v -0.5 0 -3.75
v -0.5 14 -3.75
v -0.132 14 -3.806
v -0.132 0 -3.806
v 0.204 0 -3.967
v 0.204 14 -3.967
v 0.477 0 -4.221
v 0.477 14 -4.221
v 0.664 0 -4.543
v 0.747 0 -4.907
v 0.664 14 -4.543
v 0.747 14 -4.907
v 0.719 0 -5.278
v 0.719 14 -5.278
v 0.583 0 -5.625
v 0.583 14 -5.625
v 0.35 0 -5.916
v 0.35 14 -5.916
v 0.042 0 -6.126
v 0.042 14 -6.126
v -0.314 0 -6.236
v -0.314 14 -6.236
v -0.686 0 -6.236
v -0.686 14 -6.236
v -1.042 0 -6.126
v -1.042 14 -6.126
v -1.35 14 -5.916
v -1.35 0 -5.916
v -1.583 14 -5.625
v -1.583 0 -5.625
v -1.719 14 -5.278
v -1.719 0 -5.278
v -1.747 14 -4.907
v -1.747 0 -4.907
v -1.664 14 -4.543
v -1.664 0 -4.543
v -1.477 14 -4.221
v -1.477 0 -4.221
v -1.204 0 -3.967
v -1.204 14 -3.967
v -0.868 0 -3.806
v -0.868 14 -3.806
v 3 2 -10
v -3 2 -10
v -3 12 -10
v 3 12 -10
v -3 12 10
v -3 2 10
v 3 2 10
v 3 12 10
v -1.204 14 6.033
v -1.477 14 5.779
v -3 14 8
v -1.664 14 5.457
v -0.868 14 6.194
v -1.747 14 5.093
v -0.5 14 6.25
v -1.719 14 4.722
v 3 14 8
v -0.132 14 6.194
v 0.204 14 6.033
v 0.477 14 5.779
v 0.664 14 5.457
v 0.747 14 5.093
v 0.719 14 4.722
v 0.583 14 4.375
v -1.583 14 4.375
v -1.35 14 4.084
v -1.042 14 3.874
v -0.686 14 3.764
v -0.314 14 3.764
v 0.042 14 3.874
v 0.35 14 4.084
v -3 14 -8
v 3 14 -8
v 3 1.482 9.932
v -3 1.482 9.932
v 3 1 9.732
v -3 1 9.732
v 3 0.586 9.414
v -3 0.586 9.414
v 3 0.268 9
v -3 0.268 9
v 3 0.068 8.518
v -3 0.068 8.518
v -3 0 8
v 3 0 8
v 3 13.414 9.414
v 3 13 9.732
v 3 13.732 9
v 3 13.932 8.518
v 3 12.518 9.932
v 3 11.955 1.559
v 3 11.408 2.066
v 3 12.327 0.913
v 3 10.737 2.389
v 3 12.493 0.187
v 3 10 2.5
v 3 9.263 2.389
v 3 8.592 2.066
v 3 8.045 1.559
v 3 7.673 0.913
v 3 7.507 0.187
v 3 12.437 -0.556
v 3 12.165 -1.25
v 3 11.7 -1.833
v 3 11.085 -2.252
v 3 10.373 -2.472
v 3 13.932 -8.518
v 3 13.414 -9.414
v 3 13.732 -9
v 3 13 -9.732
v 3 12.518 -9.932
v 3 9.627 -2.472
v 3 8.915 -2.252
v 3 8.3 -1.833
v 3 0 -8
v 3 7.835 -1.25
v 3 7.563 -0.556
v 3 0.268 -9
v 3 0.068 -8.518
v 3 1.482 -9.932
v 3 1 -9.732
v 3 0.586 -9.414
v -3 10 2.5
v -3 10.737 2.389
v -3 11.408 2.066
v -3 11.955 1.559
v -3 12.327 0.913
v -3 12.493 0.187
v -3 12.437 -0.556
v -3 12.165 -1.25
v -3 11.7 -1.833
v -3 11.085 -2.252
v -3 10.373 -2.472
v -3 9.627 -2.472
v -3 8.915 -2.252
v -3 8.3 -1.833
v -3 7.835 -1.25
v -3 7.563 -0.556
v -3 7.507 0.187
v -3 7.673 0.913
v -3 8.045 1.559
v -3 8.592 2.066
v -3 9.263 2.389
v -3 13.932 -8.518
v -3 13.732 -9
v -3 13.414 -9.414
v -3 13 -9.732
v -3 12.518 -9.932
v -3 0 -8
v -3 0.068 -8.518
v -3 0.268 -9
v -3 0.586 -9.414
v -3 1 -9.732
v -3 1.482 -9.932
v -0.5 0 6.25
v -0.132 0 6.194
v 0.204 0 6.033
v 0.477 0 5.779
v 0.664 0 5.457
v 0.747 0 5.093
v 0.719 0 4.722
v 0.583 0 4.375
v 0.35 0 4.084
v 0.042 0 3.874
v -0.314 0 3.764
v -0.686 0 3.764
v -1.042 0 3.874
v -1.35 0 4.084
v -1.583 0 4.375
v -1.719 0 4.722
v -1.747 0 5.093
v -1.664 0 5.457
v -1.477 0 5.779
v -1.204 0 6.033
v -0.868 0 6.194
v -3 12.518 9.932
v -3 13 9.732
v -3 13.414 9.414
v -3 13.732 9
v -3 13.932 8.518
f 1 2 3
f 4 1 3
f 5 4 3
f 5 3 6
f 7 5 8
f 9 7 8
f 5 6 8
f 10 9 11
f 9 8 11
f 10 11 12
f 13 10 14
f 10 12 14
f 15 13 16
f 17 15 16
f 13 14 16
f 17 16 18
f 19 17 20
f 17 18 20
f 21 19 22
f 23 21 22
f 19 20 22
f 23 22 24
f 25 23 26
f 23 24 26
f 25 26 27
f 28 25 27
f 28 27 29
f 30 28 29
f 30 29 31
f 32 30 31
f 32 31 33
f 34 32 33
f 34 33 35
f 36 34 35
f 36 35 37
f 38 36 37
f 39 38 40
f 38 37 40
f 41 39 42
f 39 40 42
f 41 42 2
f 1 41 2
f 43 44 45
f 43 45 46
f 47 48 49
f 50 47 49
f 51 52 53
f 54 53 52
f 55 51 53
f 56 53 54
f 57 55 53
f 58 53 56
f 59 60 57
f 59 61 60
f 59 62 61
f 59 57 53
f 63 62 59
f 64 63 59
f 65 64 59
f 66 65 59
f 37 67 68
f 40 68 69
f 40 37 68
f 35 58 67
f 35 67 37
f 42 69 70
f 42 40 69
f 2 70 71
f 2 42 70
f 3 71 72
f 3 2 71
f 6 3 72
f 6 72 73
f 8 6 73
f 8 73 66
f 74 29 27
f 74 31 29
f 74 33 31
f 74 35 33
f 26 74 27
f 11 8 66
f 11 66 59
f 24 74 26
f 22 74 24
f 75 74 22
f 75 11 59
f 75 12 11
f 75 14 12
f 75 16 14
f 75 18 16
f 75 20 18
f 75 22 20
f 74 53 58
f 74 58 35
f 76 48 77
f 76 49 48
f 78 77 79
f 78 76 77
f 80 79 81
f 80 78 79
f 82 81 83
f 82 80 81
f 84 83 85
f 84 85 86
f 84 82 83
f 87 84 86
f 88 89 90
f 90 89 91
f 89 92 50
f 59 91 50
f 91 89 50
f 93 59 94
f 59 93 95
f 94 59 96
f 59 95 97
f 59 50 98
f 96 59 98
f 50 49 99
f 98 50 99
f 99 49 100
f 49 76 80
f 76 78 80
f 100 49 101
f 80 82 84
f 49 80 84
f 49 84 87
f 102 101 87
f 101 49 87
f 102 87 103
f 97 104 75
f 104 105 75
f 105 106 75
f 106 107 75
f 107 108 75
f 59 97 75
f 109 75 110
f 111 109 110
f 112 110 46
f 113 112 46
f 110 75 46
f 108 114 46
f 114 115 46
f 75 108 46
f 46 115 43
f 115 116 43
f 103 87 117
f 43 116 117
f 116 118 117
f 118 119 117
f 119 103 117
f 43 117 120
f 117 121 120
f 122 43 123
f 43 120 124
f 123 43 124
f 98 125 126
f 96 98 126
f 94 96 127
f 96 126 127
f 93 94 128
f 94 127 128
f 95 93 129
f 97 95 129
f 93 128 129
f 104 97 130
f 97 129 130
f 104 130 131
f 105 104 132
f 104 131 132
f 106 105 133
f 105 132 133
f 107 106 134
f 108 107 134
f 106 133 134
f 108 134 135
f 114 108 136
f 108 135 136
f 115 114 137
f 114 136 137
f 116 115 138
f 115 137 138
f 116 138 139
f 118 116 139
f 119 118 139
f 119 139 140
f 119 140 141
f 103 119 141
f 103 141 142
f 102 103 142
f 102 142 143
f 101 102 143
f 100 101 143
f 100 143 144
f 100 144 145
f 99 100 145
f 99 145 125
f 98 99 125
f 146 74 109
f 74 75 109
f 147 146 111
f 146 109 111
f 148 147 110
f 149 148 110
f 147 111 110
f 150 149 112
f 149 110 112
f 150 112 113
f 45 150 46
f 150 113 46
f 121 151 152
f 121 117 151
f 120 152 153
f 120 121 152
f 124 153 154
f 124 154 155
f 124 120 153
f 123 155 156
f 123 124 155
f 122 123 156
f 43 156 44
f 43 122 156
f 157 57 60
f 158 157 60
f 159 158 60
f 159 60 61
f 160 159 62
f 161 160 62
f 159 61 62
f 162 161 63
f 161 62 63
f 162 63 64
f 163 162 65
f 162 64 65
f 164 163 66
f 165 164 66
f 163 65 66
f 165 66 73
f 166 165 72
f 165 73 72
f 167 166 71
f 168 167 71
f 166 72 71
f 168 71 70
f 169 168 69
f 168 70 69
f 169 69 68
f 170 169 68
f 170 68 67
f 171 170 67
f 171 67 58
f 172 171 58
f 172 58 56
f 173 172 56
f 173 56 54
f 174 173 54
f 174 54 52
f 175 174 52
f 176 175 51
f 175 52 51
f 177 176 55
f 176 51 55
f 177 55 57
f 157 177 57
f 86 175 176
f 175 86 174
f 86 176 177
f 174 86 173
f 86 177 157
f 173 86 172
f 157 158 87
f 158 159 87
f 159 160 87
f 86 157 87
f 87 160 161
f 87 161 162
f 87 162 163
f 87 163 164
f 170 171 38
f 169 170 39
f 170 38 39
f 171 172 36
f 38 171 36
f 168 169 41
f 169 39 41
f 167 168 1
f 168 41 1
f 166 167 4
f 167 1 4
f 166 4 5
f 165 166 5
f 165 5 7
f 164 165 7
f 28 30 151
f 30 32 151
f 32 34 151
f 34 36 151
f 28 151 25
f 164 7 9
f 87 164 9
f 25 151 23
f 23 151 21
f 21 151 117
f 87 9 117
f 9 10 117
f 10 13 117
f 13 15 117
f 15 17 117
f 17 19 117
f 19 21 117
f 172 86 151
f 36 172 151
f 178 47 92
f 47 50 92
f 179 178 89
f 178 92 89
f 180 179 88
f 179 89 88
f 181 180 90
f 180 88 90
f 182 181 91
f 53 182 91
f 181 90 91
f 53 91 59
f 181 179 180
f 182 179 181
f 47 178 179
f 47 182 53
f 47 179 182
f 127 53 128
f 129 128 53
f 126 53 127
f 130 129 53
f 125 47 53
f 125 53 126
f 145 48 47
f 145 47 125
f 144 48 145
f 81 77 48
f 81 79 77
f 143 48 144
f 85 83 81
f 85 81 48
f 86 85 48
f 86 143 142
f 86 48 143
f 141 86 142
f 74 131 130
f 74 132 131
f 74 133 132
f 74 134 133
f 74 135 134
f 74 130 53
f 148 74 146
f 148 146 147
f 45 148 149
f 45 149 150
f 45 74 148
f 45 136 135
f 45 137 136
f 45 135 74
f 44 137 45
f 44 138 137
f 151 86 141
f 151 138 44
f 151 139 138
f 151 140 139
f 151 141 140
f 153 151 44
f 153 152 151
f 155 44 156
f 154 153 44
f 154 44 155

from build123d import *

# Parameters (mm, degrees)
SKETCH_1_W          = 6
SKETCH_1_H          = 20
EXTRUDE_1_DEPTH     = 14
SKETCH_2_R          = 1.25
CUT_EXTRUDE_1_DEPTH = 14
SKETCH_3_R          = 2.5
CUT_EXTRUDE_2_DEPTH = 14
FILLET_1_R          = 2


with BuildPart() as part:
    # 草图1 → 凸台-拉伸1 (new body)
    with BuildSketch(Plane(origin=(0, 0, 0), x_dir=(1, 0, 0), z_dir=(0, 1, 0))):
        Rectangle(SKETCH_1_W, SKETCH_1_H)
    extrude(amount=EXTRUDE_1_DEPTH)

    # 草图2 → 切除-拉伸1 (cut)
    with BuildSketch(Plane(origin=(0, 14, 0), x_dir=(1, 0, 0), z_dir=(0, 1, 0))):
        with Locations(Location((-0.5, -5, 0), (0, 0, 270))):
            Circle(SKETCH_2_R)
        with Locations(Location((-0.5, 5, 0), (0, 0, 270))):
            Circle(SKETCH_2_R)
    extrude(amount=-CUT_EXTRUDE_1_DEPTH, mode=Mode.SUBTRACT)

    # 草图3 → 切除-拉伸2 (cut)
    with BuildSketch(Plane.ZY.offset(3)):
        with Locations((0, 10)):
            Circle(SKETCH_3_R)
    extrude(amount=-CUT_EXTRUDE_2_DEPTH, mode=Mode.SUBTRACT)

    # 圆角1
    fillet_1_edges = [part.edges().sort_by_distance(p)[0] for p in [
        (0, 14, 10),
        (0, 0, 10),
        (0, 0, -10),
        (0, 14, -10),
    ]]
    fillet(fillet_1_edges, radius=FILLET_1_R)


solid = part.part
